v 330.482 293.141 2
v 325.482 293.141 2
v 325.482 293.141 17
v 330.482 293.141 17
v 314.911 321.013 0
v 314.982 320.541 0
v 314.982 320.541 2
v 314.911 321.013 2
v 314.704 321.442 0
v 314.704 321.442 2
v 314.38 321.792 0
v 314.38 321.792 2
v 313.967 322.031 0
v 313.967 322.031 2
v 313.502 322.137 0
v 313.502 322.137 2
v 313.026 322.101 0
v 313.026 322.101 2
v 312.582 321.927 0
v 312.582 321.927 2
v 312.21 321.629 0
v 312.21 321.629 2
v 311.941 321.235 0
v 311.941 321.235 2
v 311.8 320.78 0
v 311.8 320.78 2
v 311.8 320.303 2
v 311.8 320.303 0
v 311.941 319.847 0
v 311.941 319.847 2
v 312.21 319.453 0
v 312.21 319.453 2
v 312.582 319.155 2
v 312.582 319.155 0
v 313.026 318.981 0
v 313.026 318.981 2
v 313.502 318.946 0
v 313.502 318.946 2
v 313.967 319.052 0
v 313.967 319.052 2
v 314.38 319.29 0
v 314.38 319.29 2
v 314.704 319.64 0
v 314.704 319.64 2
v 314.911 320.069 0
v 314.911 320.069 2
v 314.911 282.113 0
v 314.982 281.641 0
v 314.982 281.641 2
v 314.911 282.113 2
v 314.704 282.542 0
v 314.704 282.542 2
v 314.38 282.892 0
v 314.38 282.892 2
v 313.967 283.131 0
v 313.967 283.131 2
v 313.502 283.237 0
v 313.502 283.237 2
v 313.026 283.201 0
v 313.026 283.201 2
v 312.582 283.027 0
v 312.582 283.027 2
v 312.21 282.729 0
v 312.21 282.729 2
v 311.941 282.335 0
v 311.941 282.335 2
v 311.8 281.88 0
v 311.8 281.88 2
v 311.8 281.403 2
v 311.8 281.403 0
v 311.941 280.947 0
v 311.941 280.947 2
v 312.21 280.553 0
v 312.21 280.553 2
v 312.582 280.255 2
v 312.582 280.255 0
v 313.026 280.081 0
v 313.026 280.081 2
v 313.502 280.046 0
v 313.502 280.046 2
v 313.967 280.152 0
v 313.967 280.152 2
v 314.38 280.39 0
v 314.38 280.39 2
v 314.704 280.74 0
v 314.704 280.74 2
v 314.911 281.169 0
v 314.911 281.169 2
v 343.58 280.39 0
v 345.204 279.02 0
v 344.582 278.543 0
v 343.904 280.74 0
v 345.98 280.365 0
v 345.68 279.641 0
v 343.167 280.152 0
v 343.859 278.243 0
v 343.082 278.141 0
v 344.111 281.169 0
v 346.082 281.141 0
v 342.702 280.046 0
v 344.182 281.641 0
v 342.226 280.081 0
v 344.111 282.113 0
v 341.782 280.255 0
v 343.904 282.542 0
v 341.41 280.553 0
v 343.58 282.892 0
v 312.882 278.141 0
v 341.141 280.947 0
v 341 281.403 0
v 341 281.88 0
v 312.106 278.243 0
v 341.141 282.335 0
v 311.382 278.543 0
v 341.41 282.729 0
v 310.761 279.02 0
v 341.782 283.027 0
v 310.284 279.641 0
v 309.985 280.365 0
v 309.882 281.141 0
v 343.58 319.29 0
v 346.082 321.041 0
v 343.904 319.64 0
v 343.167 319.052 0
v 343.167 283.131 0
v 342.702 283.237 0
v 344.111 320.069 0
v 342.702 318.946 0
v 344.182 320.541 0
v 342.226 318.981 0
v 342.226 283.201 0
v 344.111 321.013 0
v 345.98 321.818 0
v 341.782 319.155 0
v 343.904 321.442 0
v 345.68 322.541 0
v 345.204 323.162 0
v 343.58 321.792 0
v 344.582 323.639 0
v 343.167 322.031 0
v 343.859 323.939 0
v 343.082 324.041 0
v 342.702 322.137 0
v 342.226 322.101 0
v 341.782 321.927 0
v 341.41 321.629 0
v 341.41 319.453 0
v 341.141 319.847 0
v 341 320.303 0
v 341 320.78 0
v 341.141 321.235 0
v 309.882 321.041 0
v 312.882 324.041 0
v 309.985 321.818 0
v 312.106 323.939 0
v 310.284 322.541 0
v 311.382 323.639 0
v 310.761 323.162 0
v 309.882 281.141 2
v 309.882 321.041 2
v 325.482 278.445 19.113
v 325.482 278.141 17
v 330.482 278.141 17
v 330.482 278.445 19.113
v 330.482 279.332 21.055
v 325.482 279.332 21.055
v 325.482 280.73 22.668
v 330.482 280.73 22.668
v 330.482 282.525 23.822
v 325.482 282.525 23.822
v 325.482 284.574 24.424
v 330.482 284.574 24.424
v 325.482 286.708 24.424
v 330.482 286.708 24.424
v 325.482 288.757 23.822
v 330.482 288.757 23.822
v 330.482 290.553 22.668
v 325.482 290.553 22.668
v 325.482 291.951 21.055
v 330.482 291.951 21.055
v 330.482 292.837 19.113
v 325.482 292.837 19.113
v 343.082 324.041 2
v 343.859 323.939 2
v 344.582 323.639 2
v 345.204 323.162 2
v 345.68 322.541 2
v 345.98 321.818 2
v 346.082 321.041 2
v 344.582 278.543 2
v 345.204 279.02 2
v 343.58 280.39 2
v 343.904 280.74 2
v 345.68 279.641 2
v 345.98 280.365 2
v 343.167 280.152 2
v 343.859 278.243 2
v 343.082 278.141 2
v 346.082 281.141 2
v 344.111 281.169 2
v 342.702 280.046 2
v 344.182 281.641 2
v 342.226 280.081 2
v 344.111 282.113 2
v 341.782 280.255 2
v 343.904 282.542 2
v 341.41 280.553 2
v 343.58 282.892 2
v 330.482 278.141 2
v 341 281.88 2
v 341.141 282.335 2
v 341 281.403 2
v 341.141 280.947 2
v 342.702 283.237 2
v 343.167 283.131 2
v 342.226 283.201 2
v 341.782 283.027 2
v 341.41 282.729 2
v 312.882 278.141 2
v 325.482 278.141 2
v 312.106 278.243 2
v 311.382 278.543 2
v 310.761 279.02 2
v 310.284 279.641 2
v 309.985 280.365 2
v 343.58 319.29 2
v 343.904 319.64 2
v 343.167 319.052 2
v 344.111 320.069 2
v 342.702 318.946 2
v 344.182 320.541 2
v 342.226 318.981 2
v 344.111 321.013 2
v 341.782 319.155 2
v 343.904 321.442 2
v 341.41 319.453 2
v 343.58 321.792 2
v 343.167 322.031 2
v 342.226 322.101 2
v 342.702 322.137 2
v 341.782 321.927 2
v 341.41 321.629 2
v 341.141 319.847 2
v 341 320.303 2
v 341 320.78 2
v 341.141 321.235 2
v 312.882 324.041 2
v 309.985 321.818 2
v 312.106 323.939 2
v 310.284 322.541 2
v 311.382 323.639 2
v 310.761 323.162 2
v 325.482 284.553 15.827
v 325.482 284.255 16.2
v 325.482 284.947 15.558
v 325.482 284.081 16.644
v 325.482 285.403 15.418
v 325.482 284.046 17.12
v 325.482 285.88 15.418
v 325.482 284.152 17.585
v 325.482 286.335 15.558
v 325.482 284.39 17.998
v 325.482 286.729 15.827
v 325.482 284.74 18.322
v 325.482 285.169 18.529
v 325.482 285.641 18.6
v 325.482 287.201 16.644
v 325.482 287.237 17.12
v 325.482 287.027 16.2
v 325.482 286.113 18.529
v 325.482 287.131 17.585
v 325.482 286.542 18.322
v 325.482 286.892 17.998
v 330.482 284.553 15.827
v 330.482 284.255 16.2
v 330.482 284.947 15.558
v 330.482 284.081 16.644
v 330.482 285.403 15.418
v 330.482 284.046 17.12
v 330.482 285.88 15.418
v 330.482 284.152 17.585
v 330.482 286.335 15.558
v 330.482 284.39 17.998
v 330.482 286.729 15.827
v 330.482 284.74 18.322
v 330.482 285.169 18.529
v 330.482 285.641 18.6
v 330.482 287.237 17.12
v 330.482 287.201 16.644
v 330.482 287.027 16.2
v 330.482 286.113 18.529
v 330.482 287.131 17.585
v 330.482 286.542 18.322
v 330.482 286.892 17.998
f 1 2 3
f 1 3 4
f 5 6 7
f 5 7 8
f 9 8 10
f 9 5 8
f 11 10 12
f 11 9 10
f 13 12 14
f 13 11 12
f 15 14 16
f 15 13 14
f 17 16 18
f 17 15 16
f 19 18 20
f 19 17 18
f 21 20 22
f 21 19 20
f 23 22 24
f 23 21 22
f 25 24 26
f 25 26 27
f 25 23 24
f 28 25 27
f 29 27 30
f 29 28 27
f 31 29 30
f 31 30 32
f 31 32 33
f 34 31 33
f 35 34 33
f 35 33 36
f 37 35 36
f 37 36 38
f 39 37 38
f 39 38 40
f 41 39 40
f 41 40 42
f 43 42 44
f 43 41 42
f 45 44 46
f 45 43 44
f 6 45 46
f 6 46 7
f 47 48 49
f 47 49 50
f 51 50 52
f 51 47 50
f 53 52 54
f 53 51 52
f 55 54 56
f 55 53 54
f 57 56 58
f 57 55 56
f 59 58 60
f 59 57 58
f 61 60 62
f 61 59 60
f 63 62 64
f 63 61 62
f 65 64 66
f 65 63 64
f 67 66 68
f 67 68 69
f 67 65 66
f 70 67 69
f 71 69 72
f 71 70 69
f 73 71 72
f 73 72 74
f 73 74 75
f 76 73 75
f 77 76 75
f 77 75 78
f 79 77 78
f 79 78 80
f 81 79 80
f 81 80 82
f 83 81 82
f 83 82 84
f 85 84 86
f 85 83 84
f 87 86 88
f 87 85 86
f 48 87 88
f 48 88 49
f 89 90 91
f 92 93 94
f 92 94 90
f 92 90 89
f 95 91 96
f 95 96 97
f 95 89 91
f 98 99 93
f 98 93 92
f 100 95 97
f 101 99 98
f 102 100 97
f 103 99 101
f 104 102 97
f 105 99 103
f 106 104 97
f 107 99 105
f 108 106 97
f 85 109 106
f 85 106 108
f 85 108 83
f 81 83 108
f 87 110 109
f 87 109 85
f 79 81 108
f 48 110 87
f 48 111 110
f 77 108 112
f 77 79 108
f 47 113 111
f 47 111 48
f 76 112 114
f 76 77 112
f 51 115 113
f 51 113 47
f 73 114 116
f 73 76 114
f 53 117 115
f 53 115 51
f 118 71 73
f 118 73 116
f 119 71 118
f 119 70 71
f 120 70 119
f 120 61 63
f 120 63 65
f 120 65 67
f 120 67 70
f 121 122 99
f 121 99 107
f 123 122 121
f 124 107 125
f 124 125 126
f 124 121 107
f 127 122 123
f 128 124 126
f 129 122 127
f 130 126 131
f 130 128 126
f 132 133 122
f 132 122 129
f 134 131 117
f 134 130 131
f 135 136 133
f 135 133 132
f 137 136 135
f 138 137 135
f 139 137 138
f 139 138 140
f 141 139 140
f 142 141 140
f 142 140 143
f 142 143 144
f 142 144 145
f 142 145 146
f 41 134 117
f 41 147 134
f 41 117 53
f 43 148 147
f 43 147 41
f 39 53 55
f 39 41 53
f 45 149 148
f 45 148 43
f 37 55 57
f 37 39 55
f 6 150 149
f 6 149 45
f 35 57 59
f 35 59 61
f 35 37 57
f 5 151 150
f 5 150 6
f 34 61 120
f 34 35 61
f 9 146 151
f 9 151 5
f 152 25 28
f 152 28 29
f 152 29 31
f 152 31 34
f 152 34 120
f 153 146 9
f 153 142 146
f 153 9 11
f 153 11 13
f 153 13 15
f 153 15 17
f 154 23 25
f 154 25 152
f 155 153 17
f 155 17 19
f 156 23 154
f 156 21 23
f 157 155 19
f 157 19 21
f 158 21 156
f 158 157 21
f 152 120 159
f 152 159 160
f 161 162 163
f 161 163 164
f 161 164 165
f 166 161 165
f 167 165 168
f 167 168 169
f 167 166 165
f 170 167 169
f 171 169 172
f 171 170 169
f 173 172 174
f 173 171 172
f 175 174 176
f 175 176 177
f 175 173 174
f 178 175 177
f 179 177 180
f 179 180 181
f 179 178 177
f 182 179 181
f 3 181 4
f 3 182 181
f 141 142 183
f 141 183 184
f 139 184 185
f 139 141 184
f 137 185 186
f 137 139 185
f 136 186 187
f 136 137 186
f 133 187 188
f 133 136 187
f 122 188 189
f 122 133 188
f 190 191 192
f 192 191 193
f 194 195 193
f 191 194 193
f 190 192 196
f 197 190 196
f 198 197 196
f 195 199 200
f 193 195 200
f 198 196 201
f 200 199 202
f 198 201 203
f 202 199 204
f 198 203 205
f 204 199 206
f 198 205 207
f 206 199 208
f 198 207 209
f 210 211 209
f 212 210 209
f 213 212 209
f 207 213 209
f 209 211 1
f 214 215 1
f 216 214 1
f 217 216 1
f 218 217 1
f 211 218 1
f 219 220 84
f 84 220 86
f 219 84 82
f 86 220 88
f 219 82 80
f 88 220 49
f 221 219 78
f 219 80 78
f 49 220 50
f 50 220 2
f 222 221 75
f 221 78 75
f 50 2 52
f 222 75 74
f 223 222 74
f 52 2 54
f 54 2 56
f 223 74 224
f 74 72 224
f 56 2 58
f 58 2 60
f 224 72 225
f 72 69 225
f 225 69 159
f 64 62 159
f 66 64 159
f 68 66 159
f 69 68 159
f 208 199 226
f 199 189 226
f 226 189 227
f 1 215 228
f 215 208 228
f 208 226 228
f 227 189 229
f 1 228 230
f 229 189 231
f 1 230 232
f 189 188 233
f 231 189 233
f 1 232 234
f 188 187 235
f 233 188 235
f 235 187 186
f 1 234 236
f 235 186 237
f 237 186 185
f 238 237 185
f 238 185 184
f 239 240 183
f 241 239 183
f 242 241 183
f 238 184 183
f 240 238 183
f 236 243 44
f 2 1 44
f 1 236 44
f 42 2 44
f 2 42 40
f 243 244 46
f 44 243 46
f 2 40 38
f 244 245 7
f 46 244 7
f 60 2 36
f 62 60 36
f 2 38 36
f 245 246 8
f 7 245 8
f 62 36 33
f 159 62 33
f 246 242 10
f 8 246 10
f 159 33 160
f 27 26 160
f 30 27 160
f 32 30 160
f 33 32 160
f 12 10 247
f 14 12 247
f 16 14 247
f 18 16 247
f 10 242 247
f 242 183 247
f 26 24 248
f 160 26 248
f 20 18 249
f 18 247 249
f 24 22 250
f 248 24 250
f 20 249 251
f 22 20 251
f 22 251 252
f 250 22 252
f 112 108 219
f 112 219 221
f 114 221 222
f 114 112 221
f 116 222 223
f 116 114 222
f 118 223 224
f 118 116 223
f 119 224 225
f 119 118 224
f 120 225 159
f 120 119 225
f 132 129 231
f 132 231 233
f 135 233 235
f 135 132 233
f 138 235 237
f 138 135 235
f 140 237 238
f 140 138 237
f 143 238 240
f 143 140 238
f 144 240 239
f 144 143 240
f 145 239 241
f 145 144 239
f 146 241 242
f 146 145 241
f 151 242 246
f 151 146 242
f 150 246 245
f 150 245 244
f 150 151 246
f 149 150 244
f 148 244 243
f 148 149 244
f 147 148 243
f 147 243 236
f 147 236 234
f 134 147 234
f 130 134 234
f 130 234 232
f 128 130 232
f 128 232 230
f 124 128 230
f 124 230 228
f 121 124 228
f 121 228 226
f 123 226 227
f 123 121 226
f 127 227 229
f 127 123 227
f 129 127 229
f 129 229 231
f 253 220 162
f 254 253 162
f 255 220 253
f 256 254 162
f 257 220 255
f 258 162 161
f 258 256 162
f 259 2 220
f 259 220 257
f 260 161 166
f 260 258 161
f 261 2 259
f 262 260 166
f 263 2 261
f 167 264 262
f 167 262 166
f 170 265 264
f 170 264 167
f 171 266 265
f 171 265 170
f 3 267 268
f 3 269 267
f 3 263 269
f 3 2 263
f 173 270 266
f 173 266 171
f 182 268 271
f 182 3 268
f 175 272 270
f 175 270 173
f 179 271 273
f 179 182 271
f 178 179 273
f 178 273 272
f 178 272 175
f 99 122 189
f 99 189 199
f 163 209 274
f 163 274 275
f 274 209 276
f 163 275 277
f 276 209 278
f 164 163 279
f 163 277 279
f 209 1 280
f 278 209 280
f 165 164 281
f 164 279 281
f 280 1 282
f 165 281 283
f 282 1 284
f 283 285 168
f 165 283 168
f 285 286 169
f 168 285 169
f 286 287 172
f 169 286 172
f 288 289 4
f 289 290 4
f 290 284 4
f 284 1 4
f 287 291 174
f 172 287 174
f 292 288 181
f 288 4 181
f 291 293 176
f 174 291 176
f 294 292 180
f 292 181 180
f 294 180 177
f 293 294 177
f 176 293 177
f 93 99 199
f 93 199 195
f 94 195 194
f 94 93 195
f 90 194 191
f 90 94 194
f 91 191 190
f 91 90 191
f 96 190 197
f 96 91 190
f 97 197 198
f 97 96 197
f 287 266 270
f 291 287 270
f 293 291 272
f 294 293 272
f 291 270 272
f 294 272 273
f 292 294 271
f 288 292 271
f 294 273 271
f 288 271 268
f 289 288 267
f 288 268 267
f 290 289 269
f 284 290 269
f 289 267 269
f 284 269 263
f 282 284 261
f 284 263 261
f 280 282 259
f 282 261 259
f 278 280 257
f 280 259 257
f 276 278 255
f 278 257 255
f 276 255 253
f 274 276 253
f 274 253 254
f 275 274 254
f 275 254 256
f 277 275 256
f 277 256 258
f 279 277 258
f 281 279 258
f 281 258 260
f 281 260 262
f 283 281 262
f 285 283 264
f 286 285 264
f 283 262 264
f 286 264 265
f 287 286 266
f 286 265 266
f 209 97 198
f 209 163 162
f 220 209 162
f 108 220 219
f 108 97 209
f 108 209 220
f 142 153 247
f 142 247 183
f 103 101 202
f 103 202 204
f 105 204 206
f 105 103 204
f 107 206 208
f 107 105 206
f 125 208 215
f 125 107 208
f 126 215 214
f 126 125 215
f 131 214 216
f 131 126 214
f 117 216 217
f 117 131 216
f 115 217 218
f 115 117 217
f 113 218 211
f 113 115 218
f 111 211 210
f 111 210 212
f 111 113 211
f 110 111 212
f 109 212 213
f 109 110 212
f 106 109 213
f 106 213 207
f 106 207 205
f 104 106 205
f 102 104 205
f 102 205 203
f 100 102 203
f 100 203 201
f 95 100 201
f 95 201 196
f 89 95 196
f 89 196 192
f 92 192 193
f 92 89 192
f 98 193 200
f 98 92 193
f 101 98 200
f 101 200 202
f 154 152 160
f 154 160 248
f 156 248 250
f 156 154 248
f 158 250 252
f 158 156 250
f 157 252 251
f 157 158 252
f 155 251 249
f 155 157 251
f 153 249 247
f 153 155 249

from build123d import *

# Parameters (mm, degrees)
MODEL_R             = 1.6
EXTRUDE_1_DEPTH     = 2
SKETCH_2_W          = 5
SKETCH_2_H          = 15
EXTRUDE_2_DEPTH     = 15
EXTRUDE_3_DEPTH     = 5
SKETCH_4_R          = 1.6
CUT_EXTRUDE_1_DEPTH = 5


with BuildPart() as part:
    # Model → 凸台-拉伸1 (new body)
    with BuildSketch(Plane.XY):
        with BuildLine():
            Line((312.88241623, 324.041107056), (343.08241623, 324.041107056))
            ThreePointArc((343.08241623, 324.041107056), (345.203736573, 323.1624274), (346.08241623, 321.041107056))
            Line((346.08241623, 321.041107056), (346.08241623, 281.141107056))
            ThreePointArc((346.08241623, 281.141107056), (345.203736573, 279.019786713), (343.08241623, 278.141107056))
            Line((343.08241623, 278.141107056), (312.88241623, 278.141107056))
            ThreePointArc((312.88241623, 278.141107056), (310.761095886, 279.019786713), (309.88241623, 281.141107056))
            Line((309.88241623, 281.141107056), (309.88241623, 321.041107056))
            ThreePointArc((309.88241623, 321.041107056), (310.761095886, 323.1624274), (312.88241623, 324.041107056))
        make_face()
        with Locations((313.38241623, 320.541107056)):
            Circle(MODEL_R, mode=Mode.SUBTRACT)
        with Locations((313.38241623, 281.641107056)):
            Circle(MODEL_R, mode=Mode.SUBTRACT)
        with Locations((342.58241623, 320.541107056)):
            Circle(MODEL_R, mode=Mode.SUBTRACT)
        with Locations((342.58241623, 281.641107056)):
            Circle(MODEL_R, mode=Mode.SUBTRACT)
    extrude(amount=EXTRUDE_1_DEPTH)

    # 草图2 → 凸台-拉伸2 (add)
    with BuildSketch(Plane.XY.offset(2)):
        with Locations((327.98241623, 285.641107056)):
            Rectangle(SKETCH_2_W, SKETCH_2_H)
    extrude(amount=EXTRUDE_2_DEPTH)

    # 草图3 → 凸台-拉伸3 (add)
    with BuildSketch(Plane.ZY.offset(-325.48241623)):
        with BuildLine():
            Line((17, 293.141107056), (17, 278.141107056))
            ThreePointArc((17, 278.141107056), (24.5, 285.641107056), (17, 293.141107056))
        make_face()
    extrude(amount=-EXTRUDE_3_DEPTH)

    # 草图4 → 切除-拉伸1 (cut)
    with BuildSketch(Plane.ZY.offset(-325.48241623)):
        with Locations((17, 285.641107056)):
            Circle(SKETCH_4_R)
    extrude(amount=-CUT_EXTRUDE_1_DEPTH, mode=Mode.SUBTRACT)


solid = part.part
